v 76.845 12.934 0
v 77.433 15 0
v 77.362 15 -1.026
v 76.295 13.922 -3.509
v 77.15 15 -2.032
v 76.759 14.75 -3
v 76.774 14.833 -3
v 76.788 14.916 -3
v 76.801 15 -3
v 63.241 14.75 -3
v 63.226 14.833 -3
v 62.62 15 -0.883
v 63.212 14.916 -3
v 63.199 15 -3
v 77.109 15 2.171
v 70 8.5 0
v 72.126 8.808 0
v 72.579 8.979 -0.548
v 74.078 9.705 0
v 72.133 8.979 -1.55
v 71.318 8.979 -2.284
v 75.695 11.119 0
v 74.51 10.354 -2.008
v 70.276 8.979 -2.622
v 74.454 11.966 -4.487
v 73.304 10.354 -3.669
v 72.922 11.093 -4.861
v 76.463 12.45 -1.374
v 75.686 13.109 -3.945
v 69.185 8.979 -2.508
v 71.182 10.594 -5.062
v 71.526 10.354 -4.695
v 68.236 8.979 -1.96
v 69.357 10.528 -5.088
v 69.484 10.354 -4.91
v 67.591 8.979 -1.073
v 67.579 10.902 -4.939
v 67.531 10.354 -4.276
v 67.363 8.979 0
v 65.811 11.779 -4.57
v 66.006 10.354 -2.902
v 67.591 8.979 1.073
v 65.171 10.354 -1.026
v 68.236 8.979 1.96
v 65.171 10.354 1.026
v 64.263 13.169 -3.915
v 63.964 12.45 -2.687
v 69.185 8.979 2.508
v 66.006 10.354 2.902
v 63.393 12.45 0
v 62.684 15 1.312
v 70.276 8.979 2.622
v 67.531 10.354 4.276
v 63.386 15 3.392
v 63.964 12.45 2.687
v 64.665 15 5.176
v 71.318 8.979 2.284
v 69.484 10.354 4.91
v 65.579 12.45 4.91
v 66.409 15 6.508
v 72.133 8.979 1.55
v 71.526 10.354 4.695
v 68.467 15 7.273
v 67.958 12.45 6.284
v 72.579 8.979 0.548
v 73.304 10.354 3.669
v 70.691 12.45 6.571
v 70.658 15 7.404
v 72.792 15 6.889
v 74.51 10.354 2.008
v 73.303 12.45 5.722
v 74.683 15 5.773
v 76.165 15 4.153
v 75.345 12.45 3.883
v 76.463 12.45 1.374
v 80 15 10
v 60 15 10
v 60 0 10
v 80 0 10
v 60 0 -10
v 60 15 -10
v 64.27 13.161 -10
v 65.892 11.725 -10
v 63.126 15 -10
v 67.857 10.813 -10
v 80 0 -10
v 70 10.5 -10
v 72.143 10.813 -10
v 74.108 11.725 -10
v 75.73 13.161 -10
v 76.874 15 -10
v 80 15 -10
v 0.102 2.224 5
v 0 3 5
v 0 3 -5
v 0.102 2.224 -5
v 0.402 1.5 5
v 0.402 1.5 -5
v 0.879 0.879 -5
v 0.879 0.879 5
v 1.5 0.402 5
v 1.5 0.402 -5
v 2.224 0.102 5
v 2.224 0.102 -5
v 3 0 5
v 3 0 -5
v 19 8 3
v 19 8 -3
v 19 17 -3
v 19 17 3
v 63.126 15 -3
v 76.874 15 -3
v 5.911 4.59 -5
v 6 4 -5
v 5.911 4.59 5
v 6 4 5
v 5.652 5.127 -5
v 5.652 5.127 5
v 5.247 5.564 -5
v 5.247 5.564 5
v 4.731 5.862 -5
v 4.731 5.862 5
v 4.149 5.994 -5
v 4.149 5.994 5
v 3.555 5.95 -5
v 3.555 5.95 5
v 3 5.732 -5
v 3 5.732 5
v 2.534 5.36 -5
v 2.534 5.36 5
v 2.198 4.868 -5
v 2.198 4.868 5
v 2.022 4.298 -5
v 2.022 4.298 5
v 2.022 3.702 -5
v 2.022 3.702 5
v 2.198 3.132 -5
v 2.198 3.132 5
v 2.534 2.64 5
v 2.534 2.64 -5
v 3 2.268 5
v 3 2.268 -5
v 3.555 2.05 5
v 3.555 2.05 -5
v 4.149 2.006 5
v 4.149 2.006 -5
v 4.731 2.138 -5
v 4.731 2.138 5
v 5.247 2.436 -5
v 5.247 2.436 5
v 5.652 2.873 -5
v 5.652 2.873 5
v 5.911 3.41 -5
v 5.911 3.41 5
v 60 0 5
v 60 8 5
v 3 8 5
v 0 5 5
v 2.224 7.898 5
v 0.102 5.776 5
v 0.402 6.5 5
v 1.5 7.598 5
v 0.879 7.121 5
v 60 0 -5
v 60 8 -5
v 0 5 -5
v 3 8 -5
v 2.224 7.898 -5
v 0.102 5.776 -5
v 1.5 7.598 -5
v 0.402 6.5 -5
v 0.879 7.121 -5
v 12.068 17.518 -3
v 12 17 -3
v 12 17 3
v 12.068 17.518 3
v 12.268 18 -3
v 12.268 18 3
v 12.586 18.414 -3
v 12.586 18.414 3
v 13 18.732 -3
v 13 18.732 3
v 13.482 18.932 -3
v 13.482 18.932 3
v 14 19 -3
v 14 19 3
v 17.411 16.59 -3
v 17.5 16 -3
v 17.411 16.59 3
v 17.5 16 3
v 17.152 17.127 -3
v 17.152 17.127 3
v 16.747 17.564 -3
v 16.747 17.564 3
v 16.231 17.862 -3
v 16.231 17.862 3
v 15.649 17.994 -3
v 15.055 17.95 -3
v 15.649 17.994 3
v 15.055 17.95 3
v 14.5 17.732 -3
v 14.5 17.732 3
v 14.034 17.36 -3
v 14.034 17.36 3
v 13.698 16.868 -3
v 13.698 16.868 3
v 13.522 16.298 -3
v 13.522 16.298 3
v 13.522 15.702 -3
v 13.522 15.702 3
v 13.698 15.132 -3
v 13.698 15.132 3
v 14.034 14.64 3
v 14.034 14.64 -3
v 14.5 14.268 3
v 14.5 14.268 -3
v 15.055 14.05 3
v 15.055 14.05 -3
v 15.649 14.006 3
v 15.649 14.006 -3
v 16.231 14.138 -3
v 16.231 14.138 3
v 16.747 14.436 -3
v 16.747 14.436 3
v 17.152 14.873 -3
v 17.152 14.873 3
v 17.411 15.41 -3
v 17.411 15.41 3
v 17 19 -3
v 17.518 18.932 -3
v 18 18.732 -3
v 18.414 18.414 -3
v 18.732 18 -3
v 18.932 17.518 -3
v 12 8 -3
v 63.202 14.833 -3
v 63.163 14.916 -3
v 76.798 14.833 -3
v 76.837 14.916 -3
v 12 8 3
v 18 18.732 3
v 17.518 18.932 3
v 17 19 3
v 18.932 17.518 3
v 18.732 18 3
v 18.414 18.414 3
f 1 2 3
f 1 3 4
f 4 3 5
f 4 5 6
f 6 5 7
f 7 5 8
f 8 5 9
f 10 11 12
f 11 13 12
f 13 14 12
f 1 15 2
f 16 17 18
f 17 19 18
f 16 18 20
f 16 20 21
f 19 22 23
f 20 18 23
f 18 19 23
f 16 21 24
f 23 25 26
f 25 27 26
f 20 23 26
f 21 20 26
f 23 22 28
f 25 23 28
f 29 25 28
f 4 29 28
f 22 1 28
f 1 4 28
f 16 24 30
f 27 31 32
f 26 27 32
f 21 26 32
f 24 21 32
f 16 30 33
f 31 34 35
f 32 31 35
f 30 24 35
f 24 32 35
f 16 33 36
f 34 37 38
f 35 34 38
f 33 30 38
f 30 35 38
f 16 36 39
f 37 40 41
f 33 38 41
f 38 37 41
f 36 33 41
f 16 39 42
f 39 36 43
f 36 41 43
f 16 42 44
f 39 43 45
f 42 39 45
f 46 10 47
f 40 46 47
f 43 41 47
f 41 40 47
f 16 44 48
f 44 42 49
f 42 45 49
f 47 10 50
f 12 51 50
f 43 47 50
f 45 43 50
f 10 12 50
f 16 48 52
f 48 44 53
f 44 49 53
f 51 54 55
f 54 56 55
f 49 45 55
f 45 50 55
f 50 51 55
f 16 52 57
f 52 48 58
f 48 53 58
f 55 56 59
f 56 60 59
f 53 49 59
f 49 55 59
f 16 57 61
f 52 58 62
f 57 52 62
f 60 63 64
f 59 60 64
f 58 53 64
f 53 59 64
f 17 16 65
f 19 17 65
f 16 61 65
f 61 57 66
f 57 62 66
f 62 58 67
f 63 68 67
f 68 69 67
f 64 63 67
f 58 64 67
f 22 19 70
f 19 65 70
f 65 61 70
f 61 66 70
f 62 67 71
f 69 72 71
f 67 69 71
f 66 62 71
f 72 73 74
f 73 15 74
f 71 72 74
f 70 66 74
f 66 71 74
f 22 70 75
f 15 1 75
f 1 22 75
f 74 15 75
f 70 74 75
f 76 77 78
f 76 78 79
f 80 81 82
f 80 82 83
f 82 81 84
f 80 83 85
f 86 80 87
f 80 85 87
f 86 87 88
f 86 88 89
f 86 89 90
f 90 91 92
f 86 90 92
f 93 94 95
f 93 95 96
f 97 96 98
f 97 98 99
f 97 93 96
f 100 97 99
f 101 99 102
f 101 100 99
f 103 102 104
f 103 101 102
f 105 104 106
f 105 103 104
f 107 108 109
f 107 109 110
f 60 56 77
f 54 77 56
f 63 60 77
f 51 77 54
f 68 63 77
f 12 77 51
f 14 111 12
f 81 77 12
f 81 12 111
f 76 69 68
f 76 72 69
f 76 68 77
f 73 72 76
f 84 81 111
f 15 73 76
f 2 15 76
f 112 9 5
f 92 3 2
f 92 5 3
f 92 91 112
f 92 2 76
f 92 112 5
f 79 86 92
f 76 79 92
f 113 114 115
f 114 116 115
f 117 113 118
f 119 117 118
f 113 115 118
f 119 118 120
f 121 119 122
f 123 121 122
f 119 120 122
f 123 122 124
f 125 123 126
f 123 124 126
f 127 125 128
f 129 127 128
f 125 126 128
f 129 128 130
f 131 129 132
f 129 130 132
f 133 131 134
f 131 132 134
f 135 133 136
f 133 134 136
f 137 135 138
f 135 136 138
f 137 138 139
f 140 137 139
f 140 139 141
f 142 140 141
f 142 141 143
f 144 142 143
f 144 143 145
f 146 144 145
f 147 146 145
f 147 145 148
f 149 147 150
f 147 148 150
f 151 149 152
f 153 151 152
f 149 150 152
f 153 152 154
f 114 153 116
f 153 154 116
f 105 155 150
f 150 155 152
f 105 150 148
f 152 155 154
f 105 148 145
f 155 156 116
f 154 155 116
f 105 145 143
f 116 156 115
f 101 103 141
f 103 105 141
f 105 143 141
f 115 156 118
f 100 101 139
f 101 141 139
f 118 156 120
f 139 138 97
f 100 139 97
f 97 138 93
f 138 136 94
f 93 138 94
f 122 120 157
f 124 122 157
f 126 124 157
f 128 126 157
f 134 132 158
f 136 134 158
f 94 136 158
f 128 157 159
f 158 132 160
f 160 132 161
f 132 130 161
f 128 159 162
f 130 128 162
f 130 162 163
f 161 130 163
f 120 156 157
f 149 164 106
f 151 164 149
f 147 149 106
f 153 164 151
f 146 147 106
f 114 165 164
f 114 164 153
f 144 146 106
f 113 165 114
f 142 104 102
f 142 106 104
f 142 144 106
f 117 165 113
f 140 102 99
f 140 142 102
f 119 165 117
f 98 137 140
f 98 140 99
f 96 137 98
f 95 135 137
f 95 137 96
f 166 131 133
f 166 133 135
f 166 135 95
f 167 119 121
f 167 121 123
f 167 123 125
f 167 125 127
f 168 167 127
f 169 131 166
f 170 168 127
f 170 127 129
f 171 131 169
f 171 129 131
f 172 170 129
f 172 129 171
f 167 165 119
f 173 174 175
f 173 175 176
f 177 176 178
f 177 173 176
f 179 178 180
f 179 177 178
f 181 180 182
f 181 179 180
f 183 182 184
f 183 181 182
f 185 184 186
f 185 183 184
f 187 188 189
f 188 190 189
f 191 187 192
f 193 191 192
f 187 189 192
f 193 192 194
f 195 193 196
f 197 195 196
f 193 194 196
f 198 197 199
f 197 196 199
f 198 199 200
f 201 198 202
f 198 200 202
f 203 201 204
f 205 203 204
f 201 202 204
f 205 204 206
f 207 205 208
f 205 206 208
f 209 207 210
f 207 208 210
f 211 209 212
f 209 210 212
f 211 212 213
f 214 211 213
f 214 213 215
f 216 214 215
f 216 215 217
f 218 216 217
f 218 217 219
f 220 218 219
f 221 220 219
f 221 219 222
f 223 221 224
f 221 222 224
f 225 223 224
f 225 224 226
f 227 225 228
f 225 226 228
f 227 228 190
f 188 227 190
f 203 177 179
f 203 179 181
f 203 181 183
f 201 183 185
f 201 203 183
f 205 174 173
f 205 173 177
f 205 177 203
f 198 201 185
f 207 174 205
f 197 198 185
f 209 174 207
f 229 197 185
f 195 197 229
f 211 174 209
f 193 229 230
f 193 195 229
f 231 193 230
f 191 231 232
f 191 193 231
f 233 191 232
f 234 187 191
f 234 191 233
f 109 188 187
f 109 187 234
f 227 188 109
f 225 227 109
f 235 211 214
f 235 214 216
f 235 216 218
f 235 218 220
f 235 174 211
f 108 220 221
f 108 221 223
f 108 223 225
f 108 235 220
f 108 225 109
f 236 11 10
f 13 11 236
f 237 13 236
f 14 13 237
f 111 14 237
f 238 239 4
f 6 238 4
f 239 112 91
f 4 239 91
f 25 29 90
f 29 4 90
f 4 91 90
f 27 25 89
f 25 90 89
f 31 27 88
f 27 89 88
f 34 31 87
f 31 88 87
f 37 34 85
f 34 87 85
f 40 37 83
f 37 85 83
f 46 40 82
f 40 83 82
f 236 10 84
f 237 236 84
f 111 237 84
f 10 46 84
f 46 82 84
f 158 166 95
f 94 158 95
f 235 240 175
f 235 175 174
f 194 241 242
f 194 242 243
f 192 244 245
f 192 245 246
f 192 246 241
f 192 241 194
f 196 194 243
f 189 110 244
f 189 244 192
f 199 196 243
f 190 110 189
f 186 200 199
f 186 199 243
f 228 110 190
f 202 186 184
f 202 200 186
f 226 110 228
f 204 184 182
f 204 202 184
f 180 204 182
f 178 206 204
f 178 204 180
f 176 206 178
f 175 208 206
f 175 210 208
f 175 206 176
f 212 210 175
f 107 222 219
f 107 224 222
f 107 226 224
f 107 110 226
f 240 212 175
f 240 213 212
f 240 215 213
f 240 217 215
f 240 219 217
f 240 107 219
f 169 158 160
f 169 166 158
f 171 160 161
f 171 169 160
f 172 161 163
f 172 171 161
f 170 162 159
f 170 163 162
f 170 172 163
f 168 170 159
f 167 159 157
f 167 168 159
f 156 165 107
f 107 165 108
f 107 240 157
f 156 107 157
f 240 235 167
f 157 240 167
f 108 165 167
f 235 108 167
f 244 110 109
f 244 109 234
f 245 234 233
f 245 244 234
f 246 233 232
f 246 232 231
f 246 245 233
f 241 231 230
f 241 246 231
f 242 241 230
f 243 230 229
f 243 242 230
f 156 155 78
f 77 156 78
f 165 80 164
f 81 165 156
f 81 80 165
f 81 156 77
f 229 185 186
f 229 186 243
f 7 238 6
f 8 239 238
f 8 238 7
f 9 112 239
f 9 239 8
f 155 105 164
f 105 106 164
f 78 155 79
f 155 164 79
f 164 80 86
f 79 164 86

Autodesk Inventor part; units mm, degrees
ref_plane "YZ Plane" through (0, 0, 0) normal (1, 0, 0) x (0, 1, 0)
ref_plane "XZ Plane" through (0, 0, 0) normal (0, 1, 0) x (-1, 0, 0)
ref_plane "XY Plane" through (0, 0, 0) normal (0, 0, 1) x (1, 0, 0)
sketch "草圖1" plane through (0, 0, 0) normal (0, 0, 1) x (1, 0, 0)
  line L0 (0, 0) -> (80, 0)
  line L1 (80, 0) -> (80, 8)
  line L2 (60, 8) -> (0, 8)
  line L3 (0, 8) -> (0, 0)
  line L4 (80, 8) -> (60, 8)
  line L5 (60, 8) -> (60, 15)
  line L6 (60, 15) -> (80, 15)
  line L7 (80, 15) -> (80, 8)
  dimension "d0" = 80
  dimension "d1" = 20
  dimension "d2" = 15
  dimension "d3" = 8
extrude "擠出1" add sketch "草圖1" along normal mid plane 20
sketch "草圖2" plane through (0, 0, 0) normal (0, 0, 1) x (1, 0, 0)
  line L0 (70, 31.4394) -> (70, 8.5)
  line L1 (60, 15) -> (80, 15) projected
  line L2 (80, 0) -> (80, 15) projected
  arc A0 (70, 8.5) -> (77.5, 16) centre (70, 16) ccw
  line L3 (70, 16) -> (77.5, 16)
  point P0 (0, 0)
  dimension "d14" = 7.5
  dimension "d15" = 1
  dimension "d16" = 10
sketch "草圖3" plane through (0, 8, -10) normal (0, 1, 0) x (1, 0, 0)
  line L0 (60, 0) -> (60, -20) projected
  line L1 (0, 0) -> (60, 0)
  line L2 (60, 0) -> (60, -5)
  line L3 (60, -5) -> (0, -5)
  line L4 (0, -5) -> (0, 0)
  line L5 (0, -20) -> (60, -20)
  line L6 (60, -20) -> (60, -15)
  line L7 (60, -15) -> (0, -15)
  line L8 (0, -15) -> (0, -20)
  line L9 (60, -20) -> (0, -20) projected
  point P0 (0, -10)
  dimension "d10" = 5
  dimension "d11" = 5
extrude "擠出2" cut sketch "草圖3" against normal blind 20
revolve "迴轉2" cut sketch "草圖2" angle 360 about axis through (70, 31.4394, 0) along (0, -1, 0)
sketch "草圖4" plane through (0, 8, 5) normal (0, 1, 0) x (1, 0, 0)
  line L0 (12, 8) -> (19, 8)
  line L1 (19, 8) -> (19, 2)
  line L2 (19, 2) -> (12, 2)
  line L3 (12, 2) -> (12, 8)
  point P0 (0, 5)
  dimension "d34" = 3
  dimension "d35" = 6
  dimension "d36" = 7
  dimension "d37" = 12
extrude "擠出3" add sketch "草圖4" along normal blind 11
sketch "草圖7" plane through (12, 8, 3) normal (0, 0, 1) x (1, 0, 0)
  circle A0 centre (3.5, 8) radius 2
  line L0 (7, 0) -> (0, 0) projected
  line L1 (7, 0) -> (7, 11) projected
  line L2 (0, 11) -> (7, 11) projected
  line L3 (0, 0) -> (0, 11) projected
  point P0 (-12, -8)
  dimension "d38" = 3.5
  dimension "d39" = 4
  dimension "d40" = 3
extrude "擠出6" cut sketch "草圖7" against normal blind 10 contours A0
fillet "圓角3" radius 2 2 edges at (12, 19, 0) (19, 19, 0)
fillet "圓角2" radius 3 2 edges at (0, 8, 0) (0, 0, 0)
sketch "草圖6" plane through (60, 0, 5) normal (0, 0, 1) x (1, 0, 0)
  arc A0 (-57, 8) -> (-60, 5) centre (-57, 5) ccw projected
  arc A1 (-60, 3) -> (-57, 0) centre (-57, 3) ccw projected
  circle A2 centre (-56, 4) radius 2
  line L0 (-57, 8) -> (0, 8) projected
  line L1 (-60, 3) -> (-60, 5) projected
  point P0 (-60, 0)
  dimension "d29" = 4
  dimension "d30" = 4
  dimension "d31" = 4
extrude "擠出5" cut sketch "草圖6" against normal through all
sketch "草圖10" plane through (0, 0, -10) normal (0, 0, -1) x (-1, 0, 0)
  circle A0 centre (-70, 18) radius 7.5
  line L0 (-60, 15) -> (-80, 15) projected
  point P0 (0, 0)
  dimension "d52" = 15
  dimension "d53" = 3
extrude "擠出9" cut sketch "草圖10" against normal blind 7
properties part number "連趕2"
